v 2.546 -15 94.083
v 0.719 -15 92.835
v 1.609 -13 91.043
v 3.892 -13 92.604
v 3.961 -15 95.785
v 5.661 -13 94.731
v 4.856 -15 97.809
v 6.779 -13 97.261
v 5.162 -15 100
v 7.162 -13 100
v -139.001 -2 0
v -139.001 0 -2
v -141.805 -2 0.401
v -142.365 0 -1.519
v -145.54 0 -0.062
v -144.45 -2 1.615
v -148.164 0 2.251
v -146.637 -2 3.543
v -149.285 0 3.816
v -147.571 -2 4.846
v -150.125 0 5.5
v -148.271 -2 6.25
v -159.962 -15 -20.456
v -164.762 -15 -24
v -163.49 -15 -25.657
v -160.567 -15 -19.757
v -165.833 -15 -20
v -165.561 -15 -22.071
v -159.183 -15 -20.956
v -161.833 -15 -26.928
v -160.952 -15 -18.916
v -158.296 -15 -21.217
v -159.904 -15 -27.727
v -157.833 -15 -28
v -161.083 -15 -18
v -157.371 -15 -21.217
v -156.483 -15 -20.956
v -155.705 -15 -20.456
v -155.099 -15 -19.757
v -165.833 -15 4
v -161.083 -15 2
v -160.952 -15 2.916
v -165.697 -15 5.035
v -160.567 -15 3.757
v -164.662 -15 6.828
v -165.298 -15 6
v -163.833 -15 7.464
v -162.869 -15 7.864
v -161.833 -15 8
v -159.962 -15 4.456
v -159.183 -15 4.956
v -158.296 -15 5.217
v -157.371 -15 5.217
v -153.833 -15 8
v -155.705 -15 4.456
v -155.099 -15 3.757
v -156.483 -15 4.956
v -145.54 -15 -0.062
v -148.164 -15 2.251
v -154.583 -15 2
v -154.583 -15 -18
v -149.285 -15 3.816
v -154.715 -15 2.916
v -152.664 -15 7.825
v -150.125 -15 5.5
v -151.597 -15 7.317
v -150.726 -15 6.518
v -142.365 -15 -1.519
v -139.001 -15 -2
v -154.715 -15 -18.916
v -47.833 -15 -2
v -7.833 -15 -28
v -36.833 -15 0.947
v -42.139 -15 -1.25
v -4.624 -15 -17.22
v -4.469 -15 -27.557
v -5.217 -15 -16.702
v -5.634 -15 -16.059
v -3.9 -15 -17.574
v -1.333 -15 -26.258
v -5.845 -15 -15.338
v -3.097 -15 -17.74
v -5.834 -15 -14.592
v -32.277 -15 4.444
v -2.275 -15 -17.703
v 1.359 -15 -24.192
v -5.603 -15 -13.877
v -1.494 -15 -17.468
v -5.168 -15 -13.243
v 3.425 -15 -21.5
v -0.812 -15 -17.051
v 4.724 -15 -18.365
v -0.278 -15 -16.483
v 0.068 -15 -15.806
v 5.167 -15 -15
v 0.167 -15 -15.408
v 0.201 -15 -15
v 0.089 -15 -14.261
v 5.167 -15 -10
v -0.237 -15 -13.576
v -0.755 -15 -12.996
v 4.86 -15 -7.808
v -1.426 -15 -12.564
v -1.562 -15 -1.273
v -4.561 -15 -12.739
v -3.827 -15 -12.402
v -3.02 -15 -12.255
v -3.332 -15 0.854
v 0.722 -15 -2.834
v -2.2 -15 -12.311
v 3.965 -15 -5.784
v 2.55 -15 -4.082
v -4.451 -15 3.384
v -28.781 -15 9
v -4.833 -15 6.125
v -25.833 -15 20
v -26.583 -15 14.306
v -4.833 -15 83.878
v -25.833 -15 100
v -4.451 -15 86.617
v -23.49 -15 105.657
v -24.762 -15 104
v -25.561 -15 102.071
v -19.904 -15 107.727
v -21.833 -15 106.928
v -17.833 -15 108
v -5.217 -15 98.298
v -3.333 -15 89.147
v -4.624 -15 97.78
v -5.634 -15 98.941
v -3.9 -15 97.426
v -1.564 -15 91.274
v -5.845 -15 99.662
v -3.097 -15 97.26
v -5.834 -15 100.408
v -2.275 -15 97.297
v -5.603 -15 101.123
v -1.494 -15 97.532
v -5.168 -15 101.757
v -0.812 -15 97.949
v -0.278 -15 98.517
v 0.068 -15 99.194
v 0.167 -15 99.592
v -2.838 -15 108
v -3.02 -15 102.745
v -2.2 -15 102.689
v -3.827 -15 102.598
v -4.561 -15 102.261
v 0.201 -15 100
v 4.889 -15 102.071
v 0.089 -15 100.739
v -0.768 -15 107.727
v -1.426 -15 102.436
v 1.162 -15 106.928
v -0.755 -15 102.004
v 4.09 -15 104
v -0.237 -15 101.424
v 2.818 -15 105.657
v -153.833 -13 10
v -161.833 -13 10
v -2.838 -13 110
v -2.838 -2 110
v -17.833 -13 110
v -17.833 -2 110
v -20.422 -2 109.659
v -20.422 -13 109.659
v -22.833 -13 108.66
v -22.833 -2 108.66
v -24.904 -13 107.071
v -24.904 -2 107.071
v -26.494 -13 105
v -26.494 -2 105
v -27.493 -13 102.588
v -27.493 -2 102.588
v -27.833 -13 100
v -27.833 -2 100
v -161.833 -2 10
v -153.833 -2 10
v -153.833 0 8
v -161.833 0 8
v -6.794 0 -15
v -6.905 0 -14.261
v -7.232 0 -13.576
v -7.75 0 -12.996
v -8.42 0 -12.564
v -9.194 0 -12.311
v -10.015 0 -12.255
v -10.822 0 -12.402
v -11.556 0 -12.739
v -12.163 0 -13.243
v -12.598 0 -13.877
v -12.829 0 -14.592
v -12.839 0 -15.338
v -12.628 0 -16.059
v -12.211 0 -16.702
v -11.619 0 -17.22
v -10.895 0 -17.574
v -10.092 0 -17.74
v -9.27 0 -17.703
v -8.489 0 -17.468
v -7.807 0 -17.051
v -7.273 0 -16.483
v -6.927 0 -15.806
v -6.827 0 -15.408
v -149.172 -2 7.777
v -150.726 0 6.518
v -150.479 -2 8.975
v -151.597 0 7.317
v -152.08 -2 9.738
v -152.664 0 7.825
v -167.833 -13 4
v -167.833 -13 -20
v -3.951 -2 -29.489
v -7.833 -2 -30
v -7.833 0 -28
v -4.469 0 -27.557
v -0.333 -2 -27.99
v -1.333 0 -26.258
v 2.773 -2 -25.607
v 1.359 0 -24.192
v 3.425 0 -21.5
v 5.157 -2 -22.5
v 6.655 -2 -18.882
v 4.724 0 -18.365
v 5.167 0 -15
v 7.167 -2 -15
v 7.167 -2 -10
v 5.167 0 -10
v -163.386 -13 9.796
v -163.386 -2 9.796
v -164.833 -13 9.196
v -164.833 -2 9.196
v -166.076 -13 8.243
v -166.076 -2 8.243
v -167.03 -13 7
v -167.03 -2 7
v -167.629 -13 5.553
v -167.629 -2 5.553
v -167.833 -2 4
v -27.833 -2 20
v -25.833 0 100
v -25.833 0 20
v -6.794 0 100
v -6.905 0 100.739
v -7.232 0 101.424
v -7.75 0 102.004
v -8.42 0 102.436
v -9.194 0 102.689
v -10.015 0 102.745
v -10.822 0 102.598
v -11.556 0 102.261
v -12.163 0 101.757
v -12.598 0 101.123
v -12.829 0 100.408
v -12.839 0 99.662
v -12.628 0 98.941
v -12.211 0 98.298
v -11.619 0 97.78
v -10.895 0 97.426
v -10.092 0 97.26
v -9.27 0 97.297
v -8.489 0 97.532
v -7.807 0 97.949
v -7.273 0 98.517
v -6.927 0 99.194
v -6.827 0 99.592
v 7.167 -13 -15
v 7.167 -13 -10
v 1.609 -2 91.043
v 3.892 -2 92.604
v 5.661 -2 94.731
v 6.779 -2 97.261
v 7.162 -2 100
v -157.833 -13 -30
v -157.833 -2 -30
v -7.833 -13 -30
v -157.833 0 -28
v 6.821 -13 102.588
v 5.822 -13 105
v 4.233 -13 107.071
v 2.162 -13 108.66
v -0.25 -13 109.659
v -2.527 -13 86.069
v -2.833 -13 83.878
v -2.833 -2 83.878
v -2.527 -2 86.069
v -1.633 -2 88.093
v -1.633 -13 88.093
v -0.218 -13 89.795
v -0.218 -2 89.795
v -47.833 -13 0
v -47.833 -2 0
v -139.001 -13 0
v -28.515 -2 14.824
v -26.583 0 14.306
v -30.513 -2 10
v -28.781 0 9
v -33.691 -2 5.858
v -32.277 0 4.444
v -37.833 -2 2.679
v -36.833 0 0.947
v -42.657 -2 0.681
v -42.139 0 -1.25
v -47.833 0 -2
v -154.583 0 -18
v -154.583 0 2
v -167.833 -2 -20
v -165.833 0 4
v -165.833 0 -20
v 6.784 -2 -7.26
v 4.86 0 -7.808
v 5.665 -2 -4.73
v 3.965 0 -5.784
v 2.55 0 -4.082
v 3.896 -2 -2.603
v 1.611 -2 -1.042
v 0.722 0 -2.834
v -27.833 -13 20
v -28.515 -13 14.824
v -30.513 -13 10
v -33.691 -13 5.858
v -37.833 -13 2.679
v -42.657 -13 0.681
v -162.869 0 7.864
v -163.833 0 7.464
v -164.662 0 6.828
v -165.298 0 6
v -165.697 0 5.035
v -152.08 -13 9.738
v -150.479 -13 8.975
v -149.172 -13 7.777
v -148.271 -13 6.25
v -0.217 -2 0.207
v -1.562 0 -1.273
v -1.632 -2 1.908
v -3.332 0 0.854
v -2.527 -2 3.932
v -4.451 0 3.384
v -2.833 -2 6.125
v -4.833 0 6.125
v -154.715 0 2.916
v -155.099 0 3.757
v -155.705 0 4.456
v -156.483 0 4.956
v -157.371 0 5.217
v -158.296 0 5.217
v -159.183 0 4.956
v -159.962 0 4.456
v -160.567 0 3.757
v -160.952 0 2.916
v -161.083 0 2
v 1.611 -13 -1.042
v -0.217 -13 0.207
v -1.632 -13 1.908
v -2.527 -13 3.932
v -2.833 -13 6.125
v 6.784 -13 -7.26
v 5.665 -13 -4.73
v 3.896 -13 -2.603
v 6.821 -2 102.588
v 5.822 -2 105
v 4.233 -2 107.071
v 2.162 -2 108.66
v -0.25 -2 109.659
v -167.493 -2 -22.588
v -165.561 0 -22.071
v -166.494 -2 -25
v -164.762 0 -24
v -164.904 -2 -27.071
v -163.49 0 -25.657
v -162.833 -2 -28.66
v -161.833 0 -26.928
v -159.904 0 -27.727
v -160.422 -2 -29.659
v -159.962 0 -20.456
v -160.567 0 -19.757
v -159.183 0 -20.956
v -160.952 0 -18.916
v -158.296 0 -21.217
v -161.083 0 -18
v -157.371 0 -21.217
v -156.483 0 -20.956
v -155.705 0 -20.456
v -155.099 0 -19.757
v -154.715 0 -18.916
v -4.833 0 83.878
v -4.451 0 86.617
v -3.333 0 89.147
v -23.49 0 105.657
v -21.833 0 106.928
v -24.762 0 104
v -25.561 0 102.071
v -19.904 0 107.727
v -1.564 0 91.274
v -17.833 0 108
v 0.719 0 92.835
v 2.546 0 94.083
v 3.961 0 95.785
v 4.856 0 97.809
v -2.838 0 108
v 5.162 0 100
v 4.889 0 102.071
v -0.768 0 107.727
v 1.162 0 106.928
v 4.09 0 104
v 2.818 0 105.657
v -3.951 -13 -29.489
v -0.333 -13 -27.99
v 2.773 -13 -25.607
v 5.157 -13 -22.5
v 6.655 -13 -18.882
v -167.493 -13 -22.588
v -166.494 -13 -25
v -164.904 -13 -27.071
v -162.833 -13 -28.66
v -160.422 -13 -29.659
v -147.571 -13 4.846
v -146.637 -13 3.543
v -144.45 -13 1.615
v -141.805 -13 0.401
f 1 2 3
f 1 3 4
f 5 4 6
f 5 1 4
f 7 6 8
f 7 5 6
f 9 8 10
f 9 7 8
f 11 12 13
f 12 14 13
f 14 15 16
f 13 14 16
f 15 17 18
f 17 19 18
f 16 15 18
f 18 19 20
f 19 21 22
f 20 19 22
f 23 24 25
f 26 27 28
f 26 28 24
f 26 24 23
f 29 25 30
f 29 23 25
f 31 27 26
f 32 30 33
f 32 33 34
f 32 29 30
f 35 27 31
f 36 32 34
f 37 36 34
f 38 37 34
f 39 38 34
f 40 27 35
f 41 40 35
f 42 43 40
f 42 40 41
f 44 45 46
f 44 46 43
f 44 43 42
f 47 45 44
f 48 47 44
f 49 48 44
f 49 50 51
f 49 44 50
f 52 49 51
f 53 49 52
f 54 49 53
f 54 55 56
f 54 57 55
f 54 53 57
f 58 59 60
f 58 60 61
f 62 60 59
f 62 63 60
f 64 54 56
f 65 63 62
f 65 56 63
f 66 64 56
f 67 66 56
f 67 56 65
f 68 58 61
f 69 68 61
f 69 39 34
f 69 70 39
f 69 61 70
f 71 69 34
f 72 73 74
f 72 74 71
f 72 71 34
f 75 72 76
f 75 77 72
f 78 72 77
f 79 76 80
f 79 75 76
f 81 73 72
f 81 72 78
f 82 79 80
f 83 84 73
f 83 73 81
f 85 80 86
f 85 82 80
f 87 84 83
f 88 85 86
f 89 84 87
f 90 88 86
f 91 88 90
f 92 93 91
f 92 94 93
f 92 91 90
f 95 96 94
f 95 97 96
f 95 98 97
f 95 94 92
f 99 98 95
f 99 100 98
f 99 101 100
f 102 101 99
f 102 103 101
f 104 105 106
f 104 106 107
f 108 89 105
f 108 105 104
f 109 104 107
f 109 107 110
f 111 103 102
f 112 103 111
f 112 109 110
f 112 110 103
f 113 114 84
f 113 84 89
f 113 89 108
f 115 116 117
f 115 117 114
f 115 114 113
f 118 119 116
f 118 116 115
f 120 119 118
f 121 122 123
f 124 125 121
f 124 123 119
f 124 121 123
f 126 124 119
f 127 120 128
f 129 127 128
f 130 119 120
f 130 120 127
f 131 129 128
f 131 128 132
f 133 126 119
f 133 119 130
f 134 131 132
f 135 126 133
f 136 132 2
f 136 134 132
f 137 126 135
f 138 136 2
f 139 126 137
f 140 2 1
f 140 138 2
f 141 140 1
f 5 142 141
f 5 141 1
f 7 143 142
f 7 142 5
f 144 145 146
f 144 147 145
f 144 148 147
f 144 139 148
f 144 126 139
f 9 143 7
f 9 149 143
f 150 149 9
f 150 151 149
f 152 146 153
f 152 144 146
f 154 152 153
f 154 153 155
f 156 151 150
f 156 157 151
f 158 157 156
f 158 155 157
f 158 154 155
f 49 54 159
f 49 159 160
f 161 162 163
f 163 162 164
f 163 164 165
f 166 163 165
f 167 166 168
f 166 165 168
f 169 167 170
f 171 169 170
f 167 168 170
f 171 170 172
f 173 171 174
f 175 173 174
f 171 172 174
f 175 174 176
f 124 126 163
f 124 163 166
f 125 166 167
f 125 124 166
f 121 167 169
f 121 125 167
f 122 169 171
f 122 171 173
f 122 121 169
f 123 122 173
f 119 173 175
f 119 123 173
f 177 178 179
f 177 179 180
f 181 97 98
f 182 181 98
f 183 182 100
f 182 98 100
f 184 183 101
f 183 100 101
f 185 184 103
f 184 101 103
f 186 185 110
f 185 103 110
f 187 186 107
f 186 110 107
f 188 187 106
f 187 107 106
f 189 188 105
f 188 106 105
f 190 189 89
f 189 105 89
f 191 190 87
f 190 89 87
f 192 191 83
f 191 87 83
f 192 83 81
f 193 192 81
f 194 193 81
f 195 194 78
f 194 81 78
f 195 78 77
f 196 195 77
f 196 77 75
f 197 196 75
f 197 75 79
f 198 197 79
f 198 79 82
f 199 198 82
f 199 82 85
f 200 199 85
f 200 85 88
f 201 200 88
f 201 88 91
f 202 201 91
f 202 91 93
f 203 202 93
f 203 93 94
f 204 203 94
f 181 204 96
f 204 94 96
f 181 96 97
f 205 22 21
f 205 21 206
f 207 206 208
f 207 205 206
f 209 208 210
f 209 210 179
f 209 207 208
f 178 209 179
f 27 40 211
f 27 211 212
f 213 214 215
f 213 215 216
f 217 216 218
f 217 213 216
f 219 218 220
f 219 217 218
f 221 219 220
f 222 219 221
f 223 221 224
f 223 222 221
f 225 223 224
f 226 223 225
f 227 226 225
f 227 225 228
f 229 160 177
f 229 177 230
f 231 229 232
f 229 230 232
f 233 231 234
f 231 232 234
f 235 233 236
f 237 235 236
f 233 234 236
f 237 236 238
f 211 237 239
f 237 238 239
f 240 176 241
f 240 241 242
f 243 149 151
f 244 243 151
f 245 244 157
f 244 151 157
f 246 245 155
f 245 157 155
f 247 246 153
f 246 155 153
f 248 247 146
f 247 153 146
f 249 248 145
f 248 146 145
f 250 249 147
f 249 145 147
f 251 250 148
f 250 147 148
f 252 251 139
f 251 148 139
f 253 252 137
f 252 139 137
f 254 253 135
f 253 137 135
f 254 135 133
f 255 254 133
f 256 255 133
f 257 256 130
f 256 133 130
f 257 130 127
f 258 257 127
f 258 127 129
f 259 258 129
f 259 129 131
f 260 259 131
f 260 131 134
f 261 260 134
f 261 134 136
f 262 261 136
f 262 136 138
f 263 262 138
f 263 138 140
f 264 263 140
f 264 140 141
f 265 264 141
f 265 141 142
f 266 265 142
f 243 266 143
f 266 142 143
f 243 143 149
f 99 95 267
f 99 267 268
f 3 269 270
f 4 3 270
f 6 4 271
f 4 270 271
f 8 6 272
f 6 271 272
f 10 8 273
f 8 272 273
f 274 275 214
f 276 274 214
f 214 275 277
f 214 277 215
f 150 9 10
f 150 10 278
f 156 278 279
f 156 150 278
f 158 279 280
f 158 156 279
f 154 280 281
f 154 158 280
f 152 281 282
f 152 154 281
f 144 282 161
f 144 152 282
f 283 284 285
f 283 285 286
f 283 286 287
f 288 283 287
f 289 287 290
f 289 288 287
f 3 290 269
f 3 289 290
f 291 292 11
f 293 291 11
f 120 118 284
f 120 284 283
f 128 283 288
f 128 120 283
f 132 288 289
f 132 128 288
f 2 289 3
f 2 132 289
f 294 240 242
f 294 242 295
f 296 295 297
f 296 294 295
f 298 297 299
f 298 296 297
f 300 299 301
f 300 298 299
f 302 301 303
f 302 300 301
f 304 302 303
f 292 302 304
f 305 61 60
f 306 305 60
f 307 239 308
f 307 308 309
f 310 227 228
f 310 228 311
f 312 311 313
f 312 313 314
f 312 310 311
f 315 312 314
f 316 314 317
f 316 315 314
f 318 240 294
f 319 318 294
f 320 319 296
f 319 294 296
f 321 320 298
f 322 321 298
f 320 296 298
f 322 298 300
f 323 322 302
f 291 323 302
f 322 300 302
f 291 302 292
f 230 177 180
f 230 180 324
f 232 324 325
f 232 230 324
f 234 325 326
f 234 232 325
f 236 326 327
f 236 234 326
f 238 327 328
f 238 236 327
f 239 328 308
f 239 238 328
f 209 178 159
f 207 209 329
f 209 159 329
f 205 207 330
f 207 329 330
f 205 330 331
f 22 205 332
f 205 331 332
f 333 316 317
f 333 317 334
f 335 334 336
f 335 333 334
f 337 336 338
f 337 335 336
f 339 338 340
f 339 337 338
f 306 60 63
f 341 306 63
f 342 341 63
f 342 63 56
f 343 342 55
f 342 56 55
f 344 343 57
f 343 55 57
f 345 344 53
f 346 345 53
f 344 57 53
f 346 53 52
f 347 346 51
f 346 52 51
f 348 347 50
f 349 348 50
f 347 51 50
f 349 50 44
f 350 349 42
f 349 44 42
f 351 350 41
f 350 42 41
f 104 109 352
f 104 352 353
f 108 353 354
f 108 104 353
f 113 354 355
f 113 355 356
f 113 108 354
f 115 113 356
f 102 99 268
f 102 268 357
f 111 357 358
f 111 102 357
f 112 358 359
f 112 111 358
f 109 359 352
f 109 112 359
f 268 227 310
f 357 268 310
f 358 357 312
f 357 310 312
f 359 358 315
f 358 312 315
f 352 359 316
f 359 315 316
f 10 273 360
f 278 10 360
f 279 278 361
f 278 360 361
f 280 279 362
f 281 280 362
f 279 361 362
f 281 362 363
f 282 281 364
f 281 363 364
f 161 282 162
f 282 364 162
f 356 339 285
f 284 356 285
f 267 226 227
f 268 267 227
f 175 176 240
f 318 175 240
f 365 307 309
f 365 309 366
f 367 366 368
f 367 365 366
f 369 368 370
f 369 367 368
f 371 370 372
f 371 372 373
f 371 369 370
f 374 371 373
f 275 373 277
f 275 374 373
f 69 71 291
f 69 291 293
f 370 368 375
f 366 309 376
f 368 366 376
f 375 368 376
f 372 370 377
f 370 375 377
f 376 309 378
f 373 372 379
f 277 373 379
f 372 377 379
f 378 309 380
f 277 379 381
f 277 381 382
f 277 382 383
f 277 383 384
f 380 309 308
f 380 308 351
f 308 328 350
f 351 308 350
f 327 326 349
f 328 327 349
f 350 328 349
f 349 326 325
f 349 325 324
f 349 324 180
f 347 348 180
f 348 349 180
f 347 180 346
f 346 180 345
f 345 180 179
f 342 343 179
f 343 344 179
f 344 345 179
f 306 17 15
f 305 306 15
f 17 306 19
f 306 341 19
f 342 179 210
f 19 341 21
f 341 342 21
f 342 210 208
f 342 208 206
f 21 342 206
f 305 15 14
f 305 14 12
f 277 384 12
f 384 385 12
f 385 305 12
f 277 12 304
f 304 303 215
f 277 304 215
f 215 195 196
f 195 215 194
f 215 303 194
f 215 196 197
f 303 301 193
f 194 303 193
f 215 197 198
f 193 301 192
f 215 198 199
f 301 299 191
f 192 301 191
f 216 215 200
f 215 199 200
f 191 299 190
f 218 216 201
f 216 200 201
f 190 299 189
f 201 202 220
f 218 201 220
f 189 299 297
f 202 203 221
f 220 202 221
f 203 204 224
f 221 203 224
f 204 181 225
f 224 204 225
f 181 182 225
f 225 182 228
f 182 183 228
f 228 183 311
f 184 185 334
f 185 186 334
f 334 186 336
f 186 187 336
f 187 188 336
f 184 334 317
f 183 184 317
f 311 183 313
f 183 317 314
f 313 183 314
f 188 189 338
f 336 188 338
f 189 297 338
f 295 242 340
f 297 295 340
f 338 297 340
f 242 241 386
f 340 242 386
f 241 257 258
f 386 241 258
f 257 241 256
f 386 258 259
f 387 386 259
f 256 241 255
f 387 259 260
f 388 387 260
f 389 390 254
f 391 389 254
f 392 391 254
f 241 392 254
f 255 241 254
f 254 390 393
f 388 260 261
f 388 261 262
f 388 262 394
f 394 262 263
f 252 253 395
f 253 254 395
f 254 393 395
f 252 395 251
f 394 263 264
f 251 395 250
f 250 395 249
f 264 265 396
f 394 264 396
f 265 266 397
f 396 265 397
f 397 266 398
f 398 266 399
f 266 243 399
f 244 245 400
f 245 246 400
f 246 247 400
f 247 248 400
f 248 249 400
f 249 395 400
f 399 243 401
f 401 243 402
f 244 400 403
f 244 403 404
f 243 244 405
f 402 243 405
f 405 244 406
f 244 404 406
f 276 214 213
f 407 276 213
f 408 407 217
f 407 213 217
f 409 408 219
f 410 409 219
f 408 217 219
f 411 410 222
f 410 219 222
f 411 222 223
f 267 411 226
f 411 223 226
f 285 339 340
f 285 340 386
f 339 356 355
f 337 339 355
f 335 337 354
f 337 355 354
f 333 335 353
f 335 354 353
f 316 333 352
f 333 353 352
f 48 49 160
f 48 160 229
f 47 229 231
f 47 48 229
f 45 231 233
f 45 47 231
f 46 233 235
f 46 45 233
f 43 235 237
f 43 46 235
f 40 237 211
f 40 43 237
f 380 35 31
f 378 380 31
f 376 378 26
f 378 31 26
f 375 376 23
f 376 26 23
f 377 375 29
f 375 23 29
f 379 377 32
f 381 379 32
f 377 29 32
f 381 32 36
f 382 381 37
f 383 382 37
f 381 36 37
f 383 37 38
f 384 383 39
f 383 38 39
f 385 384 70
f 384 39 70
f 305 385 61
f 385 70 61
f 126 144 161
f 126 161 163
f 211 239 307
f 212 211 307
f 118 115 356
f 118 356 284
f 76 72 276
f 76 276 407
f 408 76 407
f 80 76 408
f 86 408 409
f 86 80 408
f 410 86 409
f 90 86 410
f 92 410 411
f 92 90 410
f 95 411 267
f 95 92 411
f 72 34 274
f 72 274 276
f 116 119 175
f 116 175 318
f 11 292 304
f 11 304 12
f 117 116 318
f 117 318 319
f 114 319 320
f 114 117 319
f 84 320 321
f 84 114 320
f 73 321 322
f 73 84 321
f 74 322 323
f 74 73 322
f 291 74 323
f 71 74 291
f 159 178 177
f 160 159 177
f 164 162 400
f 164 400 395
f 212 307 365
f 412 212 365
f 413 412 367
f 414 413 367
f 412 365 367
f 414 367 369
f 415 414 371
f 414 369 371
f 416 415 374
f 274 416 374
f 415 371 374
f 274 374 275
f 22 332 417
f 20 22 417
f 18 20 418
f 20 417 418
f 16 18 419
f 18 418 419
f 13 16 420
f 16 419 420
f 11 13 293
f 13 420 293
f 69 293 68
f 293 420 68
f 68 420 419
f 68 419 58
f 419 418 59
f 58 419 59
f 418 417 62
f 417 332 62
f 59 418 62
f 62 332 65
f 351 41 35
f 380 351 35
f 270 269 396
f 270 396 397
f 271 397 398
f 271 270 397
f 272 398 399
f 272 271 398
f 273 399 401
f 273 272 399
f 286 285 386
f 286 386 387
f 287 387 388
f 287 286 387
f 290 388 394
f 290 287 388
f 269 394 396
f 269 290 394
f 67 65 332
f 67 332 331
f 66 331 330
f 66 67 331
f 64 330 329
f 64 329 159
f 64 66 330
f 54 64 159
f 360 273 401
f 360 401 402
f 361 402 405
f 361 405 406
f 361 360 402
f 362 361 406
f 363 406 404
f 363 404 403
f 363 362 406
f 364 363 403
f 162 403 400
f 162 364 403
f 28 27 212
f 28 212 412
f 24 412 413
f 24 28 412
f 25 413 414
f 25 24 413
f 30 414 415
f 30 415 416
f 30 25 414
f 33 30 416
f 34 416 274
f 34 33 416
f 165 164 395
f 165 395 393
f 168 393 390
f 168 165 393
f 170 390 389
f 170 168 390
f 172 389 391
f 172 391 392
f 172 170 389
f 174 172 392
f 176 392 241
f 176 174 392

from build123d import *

# Parameters (mm, degrees)
F1_DEPTH = 15
F3_DEPTH = 20
F8_D     = 5.5
F9_R     = 8
F10_R    = 6
F11_R    = 10
F12_SIZE = 2


# Not quite as in the source:
# - ends of sketch curves that miss each other by under 0.0002 mm in the source are joined


with BuildPart() as f1:
    # F0 (on Front) → F1 (new body)
    with BuildSketch(Plane.XZ):
        with BuildLine():
            Line((-2.8333987482, 0), (-2.8333987482, 90))
            ThreePointArc((-2.8333987482, 90), (4.2344373086, 92.9306997935), (7.1616023332, 100))
            ThreePointArc((7.1616023332, 100), (4.2326701451, 107.0710678119), (-2.8383976668, 110))
            Line((-2.8383976668, 110), (-17.8333987482, 110))
            ThreePointArc((-17.8333987482, 110), (-24.9044665601, 107.0710678119), (-27.8333987482, 100))
            Line((-27.8333987482, 100), (-27.8333987482, 20))
            ThreePointArc((-27.8333987482, 20), (-33.6912631245, 5.8578643763), (-47.8333987482, 0))
            Line((-47.8333987482, 0), (-147.8333987482, 0))
            Line((-147.8333987482, 0), (-147.8333987482, 10))
            Line((-147.8333987482, 10), (-153.8333987482, 10))
            Line((-153.8333987482, 10), (-161.8333987482, 10))
            ThreePointArc((-161.8333987482, 10), (-166.0760394353, 8.2426406871), (-167.8333987482, 4))
            Line((-167.8333987482, 4), (-167.8333987482, -20))
            ThreePointArc((-167.8333987482, -20), (-164.9044665601, -27.0710678119), (-157.8333987482, -30))
            Line((-157.8333987482, -30), (-7.8333987482, -30))
            ThreePointArc((-7.8333987482, -30), (2.7732029696, -25.6066017178), (7.1666012518, -15))
            Line((7.1666012518, -15), (7.1666012518, -10))
            ThreePointArc((7.1666012518, -10), (4.2376690637, -2.9289321881), (-2.8333987482, 0))
        make_face()
    extrude(amount=F1_DEPTH)

    # F2 (on face) → F3 (cut)
    with BuildSketch(Plane.XZ.offset(15)):
        with BuildLine():
            Line((-154.5833987482, -18), (-154.5833987482, 2))
            ThreePointArc((-154.5833987482, 2), (-157.8333987482, 5.25), (-161.0833987482, 2))
            Line((-161.0833987482, 2), (-161.0833987482, -18))
            ThreePointArc((-161.0833987482, -18), (-157.8333987482, -21.25), (-154.5833987482, -18))
        make_face()
    extrude(amount=-F3_DEPTH, mode=Mode.SUBTRACT)

    # F8 (through all)
    with Locations(Plane(origin=(-9.7913406688, 20.9975978253, 0), x_dir=(-0.906307787, -0.4226182617, 0), z_dir=(-0.4226182617, 0.906307787, 0))):
        with Locations((8.9072052754, 100), (8.9072052754, -15)):
            Hole(F8_D / 2)

    # F9
    f9_edges = [f1.edges().sort_by_distance(p)[0] for p in [
        (-2.833399, -7.5, 0),
        (-2.833399, -7.5, 90),
    ]]
    fillet(f9_edges, radius=F9_R)

    # F10
    f10_edges = [f1.edges().sort_by_distance(p)[0] for p in [
        (-147.833399, -7.5, 10),
    ]]
    fillet(f10_edges, radius=F10_R)

    # F11
    f11_edges = [f1.edges().sort_by_distance(p)[0] for p in [
        (-147.833399, -7.5, 0),
    ]]
    fillet(f11_edges, radius=F11_R)

    # F12
    f12_edges = [f1.edges().sort_by_distance(p)[0] for p in [
        (-93.4172, -15, 0),
        (-93.4172, 0, 0),
        (-150.479297, 0, 8.974937),
        (-144.591172, 0, 1.708438),
        (-157.833399, 0, 10),
        (-166.076039, 0, 8.242641),
        (-33.691263, 0, 5.857864),
        (-167.833399, 0, -8),
        (-27.833399, 0, 60),
        (-164.904467, 0, -27.071068),
        (-24.904467, 0, 107.071068),
        (-82.833399, 0, -30),
        (-10.335898, 0, 110),
        (2.773203, 0, -25.606602),
        (4.23267, 0, 107.071068),
        (7.166601, 0, -12.5),
        (5.660785, 0, 94.730854),
        (5.664967, 0, -4.729537),
        (-1.632745, 0, 88.093281),
        (-1.632091, 0, 1.908145),
        (-2.833399, 0, 45.00124),
        (-150.479297, -15, 8.974937),
        (-144.591172, -15, 1.708438),
        (-157.833399, -15, 10),
        (-166.076039, -15, 8.242641),
        (-33.691263, -15, 5.857864),
        (-167.833399, -15, -8),
        (-27.833399, -15, 60),
        (-164.904467, -15, -27.071068),
        (-24.904467, -15, 107.071068),
        (-82.833399, -15, -30),
        (-10.335898, -15, 110),
        (2.773203, -15, -25.606602),
        (4.23267, -15, 107.071068),
        (7.166601, -15, -12.5),
        (5.660785, -15, 94.730854),
        (5.664967, -15, -4.729537),
        (-1.632745, -15, 88.093281),
        (-1.632091, -15, 1.908145),
        (-2.833399, -15, 45.00124),
    ]]
    chamfer(f12_edges, length=F12_SIZE)


solid = f1.part
